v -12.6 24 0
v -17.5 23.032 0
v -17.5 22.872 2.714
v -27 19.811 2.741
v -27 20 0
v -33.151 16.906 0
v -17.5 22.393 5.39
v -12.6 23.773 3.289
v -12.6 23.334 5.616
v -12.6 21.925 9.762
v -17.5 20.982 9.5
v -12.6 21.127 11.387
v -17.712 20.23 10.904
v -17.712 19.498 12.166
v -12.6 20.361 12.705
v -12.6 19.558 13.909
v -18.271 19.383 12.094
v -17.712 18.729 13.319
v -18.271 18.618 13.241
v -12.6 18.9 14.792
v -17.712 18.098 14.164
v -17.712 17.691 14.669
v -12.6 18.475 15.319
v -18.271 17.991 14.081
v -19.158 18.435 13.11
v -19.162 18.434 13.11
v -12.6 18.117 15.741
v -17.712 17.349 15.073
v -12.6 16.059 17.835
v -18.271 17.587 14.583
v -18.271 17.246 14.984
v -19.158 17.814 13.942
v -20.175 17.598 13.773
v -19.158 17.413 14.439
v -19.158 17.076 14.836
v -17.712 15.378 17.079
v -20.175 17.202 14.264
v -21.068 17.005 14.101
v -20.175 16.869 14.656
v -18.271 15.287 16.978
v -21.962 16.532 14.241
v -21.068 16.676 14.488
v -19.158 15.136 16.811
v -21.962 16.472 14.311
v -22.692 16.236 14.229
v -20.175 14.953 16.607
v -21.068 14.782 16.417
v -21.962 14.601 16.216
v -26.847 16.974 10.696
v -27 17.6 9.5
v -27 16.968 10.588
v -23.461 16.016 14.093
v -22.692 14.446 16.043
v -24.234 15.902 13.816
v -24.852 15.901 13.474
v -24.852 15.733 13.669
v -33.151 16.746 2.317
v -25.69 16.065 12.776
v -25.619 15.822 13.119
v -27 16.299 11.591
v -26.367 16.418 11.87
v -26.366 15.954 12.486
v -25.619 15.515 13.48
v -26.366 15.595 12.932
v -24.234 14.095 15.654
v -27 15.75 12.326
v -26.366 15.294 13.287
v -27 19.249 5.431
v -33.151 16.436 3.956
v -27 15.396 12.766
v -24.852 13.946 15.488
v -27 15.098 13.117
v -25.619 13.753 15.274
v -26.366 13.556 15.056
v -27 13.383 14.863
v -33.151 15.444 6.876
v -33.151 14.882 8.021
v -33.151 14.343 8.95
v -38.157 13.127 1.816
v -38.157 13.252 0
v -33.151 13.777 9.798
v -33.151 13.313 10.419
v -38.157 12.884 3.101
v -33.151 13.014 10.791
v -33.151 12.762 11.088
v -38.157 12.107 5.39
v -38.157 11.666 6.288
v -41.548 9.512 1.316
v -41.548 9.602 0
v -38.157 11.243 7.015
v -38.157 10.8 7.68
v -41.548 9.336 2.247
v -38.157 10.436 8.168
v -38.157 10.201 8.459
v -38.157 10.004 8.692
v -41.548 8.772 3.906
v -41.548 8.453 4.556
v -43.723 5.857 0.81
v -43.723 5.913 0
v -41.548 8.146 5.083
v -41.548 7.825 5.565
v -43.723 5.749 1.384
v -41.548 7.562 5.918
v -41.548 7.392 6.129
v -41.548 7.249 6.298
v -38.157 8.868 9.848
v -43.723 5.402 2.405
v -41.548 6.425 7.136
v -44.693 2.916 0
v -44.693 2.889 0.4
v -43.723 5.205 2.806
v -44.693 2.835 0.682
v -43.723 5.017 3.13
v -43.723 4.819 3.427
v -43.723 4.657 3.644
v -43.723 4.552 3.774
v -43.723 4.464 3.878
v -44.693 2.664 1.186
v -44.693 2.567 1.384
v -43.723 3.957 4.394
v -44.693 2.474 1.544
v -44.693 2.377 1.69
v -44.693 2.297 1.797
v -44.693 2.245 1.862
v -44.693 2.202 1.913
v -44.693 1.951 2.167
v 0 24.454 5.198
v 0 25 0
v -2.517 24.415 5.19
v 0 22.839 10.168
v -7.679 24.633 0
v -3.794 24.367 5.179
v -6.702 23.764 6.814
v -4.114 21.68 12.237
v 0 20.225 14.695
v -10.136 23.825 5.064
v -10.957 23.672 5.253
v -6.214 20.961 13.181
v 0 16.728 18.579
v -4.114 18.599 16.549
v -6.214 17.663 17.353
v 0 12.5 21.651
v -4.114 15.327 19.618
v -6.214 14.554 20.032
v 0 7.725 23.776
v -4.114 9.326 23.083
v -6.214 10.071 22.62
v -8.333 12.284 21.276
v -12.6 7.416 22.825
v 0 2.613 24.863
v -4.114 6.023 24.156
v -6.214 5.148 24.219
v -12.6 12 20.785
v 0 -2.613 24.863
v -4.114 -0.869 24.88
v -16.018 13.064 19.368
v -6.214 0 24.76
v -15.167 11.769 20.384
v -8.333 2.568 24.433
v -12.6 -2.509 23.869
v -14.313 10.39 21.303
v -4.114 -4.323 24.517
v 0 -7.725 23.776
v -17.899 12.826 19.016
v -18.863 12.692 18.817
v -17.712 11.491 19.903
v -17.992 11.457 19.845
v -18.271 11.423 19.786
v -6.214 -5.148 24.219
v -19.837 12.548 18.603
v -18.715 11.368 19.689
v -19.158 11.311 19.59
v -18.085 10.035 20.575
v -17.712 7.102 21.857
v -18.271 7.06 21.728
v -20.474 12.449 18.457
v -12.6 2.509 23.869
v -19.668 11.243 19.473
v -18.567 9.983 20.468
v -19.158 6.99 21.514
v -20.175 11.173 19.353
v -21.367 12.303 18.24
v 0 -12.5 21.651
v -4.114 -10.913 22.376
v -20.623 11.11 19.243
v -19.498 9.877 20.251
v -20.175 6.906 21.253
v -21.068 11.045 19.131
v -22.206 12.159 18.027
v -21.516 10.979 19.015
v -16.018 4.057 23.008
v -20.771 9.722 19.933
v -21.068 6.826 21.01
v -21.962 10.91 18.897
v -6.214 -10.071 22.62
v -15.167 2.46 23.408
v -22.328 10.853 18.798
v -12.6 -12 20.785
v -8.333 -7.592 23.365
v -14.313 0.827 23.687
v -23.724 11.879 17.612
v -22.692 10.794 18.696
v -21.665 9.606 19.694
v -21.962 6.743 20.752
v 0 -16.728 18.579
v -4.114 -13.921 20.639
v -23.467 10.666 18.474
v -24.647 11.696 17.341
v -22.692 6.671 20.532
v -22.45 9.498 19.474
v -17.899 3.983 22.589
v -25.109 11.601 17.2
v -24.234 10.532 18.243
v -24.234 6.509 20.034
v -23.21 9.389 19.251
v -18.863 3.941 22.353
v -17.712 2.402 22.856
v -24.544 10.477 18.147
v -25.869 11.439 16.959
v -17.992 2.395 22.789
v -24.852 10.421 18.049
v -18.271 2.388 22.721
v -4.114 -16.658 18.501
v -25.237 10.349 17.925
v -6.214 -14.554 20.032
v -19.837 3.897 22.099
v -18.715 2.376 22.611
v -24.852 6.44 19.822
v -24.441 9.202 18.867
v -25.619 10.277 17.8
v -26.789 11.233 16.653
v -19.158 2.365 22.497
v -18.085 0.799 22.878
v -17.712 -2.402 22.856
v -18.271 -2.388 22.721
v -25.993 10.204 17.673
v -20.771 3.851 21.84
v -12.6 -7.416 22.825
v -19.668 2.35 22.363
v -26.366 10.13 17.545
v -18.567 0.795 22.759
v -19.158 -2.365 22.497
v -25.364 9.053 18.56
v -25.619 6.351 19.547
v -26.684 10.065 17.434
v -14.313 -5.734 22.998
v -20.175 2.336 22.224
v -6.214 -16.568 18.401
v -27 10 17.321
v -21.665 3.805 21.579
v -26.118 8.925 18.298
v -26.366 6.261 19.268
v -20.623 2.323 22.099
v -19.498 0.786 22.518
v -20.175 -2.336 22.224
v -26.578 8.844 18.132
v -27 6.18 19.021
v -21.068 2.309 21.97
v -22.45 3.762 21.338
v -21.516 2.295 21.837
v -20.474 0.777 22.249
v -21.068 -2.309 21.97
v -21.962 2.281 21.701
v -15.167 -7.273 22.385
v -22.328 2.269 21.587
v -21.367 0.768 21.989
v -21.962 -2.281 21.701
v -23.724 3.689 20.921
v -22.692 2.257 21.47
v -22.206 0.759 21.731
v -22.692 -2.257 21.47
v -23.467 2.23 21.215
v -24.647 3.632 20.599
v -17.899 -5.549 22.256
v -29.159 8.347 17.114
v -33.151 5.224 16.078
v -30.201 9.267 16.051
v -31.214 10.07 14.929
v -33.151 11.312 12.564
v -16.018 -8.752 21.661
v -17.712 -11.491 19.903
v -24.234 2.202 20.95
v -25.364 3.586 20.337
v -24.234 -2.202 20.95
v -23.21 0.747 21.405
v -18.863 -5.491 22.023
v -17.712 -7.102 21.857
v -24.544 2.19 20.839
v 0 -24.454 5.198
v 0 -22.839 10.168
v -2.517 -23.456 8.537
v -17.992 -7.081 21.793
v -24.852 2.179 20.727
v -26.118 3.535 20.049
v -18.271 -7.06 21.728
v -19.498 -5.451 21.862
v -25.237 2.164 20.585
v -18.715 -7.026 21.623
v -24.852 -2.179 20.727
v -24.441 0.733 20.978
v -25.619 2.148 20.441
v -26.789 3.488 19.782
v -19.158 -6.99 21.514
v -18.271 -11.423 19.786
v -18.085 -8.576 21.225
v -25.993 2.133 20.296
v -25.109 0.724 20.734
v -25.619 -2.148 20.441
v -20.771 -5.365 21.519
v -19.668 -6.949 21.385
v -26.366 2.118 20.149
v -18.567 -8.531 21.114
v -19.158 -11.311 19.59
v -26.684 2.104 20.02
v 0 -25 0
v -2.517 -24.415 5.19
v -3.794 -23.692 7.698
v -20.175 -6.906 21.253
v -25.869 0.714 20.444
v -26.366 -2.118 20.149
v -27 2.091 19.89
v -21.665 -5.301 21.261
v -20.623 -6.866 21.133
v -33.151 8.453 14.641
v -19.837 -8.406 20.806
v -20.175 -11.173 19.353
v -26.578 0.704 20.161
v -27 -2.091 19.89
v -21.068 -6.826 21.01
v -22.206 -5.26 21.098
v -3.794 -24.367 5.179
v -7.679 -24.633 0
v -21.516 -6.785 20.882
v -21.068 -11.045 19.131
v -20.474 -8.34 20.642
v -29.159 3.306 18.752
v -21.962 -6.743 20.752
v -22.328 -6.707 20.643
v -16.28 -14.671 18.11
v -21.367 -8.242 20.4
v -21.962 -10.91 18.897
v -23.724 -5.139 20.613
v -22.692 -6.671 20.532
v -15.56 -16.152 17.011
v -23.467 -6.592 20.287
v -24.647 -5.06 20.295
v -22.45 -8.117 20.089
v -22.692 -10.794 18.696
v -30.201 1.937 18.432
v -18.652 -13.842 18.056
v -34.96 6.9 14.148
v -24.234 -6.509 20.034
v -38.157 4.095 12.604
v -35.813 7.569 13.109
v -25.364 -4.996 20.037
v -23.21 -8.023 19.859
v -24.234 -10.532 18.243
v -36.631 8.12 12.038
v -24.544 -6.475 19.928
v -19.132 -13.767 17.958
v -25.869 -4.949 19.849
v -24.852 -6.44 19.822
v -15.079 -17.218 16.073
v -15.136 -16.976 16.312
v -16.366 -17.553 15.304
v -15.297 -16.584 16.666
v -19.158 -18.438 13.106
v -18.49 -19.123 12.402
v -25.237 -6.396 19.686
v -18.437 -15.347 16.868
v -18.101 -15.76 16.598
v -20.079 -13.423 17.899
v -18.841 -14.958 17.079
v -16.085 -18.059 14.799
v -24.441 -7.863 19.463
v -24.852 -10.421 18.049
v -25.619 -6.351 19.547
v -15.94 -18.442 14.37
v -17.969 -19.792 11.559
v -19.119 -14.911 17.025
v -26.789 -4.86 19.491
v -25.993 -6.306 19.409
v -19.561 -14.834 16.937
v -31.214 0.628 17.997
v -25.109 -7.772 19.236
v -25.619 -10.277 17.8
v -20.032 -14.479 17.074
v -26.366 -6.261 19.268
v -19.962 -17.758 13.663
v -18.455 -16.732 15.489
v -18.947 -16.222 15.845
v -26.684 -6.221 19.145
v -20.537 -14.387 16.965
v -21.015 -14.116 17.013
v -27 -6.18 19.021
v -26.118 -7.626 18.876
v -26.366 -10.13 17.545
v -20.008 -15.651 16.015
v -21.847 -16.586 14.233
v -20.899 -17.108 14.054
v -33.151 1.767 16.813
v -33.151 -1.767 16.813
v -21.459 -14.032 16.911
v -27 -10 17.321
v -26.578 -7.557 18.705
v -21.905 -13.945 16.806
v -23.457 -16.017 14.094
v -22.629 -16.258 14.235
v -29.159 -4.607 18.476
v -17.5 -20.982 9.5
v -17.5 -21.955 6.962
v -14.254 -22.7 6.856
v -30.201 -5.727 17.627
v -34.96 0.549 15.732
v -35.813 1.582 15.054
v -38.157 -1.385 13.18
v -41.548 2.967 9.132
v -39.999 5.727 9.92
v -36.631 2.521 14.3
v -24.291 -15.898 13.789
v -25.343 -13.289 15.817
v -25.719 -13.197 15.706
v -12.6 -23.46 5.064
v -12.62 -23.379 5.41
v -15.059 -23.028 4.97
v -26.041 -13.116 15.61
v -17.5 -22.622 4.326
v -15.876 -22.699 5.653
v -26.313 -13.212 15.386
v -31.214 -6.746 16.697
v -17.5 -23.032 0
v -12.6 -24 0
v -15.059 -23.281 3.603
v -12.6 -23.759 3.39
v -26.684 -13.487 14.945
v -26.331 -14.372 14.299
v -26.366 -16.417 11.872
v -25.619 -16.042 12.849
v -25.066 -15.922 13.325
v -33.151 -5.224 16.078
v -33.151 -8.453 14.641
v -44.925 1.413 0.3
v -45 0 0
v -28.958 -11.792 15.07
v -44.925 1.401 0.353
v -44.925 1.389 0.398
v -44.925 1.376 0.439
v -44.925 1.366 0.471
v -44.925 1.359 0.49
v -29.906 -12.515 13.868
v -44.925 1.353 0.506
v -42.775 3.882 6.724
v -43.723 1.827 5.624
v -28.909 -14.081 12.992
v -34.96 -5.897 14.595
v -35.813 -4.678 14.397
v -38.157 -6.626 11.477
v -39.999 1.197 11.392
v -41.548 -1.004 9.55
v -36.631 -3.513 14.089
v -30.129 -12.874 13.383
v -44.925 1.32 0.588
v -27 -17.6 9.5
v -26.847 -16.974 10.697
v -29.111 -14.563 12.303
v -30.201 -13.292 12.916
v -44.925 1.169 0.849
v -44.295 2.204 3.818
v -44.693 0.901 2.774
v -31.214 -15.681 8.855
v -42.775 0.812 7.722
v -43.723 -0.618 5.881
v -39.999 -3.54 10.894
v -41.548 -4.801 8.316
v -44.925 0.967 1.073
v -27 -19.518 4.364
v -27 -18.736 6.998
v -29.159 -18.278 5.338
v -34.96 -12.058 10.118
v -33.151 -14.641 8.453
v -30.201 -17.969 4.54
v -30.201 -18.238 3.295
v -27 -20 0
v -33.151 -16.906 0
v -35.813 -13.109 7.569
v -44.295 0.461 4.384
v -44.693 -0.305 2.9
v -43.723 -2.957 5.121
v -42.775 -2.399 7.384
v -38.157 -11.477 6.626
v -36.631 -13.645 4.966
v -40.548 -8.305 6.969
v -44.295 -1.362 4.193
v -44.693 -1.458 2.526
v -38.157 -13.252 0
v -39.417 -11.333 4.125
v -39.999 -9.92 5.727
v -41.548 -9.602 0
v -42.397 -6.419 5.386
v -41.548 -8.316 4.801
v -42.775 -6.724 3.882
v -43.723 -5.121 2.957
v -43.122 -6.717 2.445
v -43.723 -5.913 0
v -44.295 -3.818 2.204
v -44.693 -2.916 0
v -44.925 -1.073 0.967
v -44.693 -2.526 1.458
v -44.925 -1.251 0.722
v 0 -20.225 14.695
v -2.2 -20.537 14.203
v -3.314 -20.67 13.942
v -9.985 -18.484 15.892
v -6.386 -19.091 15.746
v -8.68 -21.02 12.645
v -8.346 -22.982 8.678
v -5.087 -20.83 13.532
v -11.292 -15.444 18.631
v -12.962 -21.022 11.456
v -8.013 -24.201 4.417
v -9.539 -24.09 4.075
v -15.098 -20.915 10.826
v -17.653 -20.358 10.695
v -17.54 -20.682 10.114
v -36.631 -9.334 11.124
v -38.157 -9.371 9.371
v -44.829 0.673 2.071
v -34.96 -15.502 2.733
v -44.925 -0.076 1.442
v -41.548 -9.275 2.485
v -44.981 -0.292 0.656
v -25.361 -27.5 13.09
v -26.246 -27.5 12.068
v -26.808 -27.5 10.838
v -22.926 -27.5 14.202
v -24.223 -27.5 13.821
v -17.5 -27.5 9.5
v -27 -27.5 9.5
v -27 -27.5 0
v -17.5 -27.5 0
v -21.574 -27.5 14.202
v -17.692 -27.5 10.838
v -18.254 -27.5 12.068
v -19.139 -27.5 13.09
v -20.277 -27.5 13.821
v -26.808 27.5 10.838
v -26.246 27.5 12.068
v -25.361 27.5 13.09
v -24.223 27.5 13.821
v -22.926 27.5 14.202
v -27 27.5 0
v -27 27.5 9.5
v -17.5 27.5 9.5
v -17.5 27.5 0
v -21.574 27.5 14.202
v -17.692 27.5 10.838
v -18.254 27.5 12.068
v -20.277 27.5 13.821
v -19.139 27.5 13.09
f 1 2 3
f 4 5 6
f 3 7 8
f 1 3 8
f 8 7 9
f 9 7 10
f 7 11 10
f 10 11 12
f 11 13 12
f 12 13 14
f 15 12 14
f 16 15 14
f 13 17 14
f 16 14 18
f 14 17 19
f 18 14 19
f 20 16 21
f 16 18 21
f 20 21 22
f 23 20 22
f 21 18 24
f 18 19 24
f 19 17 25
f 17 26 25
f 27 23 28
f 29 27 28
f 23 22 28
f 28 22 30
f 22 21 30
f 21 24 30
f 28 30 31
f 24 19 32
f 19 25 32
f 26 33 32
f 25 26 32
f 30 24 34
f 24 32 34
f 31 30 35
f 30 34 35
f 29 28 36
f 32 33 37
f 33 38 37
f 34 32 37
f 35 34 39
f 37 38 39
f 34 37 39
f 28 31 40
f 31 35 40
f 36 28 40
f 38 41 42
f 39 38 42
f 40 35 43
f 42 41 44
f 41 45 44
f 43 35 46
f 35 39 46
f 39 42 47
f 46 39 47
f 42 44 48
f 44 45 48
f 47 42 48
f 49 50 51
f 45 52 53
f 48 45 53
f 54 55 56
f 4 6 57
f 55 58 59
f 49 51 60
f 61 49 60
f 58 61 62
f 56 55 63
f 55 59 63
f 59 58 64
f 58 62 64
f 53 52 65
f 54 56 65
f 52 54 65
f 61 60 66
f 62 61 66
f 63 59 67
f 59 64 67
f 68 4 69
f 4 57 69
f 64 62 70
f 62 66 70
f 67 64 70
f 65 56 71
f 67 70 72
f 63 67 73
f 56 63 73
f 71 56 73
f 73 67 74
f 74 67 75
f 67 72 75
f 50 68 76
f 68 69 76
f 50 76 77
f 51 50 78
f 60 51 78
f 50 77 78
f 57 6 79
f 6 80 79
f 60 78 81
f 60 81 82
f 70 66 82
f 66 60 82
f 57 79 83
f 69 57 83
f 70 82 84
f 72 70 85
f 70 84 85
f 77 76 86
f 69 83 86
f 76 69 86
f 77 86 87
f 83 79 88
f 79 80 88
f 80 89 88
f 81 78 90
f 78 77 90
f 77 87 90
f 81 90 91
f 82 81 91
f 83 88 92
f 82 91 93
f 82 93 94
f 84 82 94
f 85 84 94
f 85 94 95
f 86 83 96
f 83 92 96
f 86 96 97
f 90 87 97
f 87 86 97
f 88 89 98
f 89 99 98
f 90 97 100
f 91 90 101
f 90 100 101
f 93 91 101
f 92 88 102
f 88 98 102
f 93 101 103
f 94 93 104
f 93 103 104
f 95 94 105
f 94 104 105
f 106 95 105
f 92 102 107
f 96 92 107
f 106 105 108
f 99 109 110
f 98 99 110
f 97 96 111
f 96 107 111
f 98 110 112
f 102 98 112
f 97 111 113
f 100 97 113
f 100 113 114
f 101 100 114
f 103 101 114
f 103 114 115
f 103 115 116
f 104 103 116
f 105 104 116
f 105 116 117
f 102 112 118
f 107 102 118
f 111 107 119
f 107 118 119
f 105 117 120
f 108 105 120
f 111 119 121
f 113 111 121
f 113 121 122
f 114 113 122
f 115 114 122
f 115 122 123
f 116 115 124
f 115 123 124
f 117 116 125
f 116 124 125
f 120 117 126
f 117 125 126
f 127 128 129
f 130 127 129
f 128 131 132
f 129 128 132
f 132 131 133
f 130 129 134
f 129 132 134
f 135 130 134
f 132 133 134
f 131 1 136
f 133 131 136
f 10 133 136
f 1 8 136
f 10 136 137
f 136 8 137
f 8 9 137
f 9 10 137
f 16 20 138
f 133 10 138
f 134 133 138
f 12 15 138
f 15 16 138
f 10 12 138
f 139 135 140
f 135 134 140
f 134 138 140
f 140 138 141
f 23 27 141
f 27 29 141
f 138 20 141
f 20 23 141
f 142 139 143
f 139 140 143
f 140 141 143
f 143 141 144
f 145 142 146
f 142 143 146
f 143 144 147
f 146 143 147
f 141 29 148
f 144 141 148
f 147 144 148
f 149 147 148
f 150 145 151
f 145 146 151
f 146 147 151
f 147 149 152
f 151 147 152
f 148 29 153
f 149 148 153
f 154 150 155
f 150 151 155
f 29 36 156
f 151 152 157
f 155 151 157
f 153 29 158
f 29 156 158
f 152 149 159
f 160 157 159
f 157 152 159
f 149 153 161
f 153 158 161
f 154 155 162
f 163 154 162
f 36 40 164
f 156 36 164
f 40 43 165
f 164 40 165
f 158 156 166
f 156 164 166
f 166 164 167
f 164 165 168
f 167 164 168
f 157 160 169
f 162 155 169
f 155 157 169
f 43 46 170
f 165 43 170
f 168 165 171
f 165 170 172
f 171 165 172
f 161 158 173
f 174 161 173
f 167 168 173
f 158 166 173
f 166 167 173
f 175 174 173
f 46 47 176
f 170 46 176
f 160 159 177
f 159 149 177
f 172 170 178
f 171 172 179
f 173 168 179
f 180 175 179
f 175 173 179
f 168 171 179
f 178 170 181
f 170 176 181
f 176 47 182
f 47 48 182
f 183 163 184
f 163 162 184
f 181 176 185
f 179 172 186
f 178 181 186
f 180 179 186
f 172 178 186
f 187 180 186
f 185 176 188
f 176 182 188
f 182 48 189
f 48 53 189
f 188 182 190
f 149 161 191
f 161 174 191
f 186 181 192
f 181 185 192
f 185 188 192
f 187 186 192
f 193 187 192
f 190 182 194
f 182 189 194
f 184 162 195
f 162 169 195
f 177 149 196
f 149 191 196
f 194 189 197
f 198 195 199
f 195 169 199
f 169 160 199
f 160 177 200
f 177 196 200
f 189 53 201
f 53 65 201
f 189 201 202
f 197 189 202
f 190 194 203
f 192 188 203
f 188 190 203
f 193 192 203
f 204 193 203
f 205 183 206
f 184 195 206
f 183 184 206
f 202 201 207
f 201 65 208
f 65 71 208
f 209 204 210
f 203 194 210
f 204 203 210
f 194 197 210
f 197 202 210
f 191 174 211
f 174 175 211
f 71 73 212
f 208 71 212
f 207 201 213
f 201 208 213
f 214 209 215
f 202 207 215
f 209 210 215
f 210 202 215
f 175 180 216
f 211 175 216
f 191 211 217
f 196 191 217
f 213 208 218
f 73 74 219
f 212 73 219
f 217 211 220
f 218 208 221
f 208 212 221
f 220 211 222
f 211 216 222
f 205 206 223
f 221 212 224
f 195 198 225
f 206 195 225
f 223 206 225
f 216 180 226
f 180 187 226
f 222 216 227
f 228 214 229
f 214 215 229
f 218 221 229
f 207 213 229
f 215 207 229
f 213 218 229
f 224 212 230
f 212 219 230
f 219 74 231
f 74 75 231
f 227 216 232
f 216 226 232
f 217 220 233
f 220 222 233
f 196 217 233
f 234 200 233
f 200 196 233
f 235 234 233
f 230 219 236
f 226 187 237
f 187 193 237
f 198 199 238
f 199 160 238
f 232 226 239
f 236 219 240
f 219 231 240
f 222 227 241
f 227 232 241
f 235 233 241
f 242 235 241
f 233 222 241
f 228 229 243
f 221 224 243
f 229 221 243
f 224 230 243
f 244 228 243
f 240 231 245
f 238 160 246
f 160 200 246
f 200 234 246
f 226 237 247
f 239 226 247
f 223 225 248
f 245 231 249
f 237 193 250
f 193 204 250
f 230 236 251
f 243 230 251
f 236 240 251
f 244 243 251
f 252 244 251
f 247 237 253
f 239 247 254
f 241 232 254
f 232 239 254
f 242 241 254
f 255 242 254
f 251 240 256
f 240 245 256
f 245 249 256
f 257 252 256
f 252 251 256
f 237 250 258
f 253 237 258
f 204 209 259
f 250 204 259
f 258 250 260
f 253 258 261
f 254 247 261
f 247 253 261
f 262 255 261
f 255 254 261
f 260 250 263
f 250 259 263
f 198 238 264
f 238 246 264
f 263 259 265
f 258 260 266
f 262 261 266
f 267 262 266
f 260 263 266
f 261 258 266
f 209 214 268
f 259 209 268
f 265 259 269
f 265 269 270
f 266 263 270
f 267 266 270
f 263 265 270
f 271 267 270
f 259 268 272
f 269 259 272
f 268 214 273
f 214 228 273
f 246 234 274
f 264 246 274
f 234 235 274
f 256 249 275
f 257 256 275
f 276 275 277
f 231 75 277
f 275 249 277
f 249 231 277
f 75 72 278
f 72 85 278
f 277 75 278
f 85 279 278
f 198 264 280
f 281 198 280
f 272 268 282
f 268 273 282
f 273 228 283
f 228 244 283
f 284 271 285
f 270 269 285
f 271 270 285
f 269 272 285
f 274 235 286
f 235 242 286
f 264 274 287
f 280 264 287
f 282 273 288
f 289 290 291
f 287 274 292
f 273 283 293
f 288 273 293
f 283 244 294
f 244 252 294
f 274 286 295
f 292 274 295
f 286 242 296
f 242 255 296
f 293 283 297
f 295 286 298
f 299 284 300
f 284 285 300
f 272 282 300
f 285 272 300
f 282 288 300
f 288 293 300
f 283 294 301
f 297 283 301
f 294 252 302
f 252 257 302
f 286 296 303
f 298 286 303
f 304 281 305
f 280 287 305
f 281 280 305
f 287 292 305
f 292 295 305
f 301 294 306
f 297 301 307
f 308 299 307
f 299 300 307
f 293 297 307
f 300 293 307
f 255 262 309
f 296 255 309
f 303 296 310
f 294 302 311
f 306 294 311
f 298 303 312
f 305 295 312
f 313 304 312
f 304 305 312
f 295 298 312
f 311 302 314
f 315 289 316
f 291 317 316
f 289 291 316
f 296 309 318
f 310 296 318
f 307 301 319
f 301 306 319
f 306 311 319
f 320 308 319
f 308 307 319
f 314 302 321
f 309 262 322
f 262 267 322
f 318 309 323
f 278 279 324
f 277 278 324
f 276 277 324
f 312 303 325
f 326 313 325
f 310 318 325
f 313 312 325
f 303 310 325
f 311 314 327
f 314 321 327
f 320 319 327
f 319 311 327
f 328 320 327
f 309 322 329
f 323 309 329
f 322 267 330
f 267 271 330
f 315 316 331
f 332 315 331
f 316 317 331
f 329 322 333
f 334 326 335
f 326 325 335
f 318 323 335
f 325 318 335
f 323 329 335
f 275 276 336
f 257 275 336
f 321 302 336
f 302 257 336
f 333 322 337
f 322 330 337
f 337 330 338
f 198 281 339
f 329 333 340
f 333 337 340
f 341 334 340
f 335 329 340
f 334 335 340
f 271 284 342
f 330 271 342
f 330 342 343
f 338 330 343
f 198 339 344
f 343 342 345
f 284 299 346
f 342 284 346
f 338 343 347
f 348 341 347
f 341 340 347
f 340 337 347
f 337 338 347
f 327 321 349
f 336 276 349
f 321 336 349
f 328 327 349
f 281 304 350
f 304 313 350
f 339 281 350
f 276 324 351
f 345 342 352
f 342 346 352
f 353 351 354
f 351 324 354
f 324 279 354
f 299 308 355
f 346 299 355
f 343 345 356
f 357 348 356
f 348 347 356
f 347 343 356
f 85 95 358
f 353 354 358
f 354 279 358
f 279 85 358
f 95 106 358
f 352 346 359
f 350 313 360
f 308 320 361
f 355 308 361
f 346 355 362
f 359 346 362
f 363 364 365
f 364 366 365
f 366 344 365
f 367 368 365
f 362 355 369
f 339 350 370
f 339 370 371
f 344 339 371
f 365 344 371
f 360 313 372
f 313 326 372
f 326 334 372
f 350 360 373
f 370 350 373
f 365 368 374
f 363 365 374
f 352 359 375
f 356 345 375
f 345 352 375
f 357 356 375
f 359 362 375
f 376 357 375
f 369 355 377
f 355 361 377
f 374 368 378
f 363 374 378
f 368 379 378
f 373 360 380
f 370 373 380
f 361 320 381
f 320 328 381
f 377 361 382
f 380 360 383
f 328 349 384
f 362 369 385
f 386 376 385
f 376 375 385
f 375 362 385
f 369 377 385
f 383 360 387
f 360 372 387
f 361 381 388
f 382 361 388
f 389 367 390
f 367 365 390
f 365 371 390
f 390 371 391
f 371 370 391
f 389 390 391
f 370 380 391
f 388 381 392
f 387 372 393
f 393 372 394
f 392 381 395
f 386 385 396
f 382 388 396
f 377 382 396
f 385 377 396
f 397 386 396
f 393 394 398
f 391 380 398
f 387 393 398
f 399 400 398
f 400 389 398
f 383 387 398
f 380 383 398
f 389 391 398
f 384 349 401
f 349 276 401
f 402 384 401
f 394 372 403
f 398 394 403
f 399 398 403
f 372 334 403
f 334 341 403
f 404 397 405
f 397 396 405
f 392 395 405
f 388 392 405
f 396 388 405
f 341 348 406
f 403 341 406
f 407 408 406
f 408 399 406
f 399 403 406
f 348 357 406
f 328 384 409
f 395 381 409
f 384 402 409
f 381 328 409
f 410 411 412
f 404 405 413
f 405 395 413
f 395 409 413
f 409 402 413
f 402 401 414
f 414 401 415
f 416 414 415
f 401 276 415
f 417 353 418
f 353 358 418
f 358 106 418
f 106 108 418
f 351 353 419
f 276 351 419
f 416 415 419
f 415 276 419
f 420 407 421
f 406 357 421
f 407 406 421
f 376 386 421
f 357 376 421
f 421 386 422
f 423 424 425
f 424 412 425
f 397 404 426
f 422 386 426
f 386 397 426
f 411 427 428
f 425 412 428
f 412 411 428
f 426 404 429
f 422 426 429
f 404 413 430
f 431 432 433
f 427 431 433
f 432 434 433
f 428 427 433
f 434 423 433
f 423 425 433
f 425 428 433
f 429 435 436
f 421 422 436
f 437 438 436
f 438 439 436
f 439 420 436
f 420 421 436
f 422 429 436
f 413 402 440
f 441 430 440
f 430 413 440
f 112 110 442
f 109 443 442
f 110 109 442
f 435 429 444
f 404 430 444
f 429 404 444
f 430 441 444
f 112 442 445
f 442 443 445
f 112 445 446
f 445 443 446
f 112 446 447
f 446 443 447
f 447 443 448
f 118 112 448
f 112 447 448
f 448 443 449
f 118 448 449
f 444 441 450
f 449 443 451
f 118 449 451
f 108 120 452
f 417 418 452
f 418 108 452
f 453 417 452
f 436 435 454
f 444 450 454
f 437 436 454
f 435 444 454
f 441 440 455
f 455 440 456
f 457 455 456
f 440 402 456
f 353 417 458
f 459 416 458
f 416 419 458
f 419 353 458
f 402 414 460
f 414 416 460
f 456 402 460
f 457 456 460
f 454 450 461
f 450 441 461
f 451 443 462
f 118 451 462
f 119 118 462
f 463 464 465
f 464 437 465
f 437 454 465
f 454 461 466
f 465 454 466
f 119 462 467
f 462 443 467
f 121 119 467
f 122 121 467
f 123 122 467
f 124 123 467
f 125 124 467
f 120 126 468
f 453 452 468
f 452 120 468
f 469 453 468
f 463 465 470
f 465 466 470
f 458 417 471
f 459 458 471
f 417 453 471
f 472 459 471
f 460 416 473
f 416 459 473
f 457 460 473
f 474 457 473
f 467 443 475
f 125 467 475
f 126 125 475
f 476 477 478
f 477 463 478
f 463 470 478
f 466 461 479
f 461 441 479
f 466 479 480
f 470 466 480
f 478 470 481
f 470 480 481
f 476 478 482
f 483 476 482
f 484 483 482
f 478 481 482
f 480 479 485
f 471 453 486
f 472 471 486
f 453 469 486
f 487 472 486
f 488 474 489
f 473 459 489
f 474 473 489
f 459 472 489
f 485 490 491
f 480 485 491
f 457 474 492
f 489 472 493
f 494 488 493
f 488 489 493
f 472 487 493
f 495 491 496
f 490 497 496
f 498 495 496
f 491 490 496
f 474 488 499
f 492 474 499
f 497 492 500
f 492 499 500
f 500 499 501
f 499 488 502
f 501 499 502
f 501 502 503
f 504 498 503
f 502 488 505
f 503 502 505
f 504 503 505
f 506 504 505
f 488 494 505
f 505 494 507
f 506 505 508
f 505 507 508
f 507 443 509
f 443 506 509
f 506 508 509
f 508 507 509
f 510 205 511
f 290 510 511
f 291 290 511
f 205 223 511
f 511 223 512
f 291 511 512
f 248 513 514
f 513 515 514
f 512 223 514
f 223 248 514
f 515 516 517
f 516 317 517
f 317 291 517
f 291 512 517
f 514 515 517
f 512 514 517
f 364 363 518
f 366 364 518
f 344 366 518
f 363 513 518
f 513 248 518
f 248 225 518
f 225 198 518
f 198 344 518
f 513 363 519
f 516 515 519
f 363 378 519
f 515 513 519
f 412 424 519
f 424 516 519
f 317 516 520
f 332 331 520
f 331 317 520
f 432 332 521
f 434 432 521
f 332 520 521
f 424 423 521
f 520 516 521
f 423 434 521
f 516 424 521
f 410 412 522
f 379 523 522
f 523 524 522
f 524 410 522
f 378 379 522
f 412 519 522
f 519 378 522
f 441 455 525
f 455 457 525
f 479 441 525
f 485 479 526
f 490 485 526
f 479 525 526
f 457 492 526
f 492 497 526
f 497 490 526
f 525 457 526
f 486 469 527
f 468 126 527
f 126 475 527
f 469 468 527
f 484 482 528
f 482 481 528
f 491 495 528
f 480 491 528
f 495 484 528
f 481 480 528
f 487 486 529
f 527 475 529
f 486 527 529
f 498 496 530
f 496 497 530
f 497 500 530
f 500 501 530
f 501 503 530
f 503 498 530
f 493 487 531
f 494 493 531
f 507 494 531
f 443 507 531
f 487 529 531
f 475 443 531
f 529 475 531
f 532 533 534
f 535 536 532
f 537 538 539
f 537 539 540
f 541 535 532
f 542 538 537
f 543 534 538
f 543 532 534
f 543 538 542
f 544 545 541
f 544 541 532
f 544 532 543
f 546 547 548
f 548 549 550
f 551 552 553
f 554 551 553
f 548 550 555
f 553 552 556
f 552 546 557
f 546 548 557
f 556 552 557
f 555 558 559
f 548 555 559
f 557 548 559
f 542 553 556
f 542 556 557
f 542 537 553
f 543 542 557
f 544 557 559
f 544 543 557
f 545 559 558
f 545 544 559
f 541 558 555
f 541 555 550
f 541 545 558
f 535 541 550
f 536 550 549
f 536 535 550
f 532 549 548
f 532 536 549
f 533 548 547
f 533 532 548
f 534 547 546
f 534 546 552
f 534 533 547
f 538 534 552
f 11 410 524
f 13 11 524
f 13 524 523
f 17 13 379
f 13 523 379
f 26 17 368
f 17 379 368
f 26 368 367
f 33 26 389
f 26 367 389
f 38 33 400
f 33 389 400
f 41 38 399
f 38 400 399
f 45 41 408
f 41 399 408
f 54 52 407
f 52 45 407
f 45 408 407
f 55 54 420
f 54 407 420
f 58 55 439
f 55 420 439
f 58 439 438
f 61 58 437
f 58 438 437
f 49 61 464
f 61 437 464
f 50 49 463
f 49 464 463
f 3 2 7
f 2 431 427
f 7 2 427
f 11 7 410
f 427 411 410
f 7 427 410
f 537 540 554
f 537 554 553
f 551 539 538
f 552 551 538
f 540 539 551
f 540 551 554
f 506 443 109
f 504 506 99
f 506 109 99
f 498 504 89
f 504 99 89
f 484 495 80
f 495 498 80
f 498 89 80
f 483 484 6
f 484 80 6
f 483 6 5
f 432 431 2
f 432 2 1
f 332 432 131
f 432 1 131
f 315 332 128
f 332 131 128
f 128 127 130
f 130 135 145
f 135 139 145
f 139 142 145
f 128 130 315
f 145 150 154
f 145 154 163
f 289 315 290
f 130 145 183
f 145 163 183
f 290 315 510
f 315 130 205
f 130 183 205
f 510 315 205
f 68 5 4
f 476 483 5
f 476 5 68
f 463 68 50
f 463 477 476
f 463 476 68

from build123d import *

# Parameters (mm, degrees)
F1_ANGLE_BACK = 90
F1_ANGLE      = 180
F2_W          = 9.5
F2_H          = 9.5
F3_DEPTH      = 27.5


with BuildPart() as f1:
    # F0 (on Front) → F1 (revolve)
    with BuildSketch(Plane.XZ, mode=Mode.PRIVATE) as f1_sk:
        with BuildLine():
            Line((0, 0), (0, 25))
            add(Edge.make_bspline(
                [(0, 25), (-45, 25), (-45, 0)],
                knots=[4.7123889804, 4.7123889804, 4.7123889804, 6.2831853072, 6.2831853072, 6.2831853072], degree=2, weights=[1, 0.7071067812, 1]))
            Line((-45, 0), (0, 0))
        make_face()
    revolve(f1_sk.sketch.rotate(Axis((-22.5, 0, 0), (1, 0, 0)), -F1_ANGLE_BACK), axis=Axis((-22.5, 0, 0), (1, 0, 0)), revolution_arc=F1_ANGLE)


with BuildPart() as f3:
    # F2 (on Front) → F3 (new body, symmetric)
    with BuildSketch(Plane.XZ):
        with Locations((-22.25, 4.75)):
            Rectangle(F2_W, F2_H)
        with BuildLine():
            ThreePointArc((-17.5, 9.5), (-22.25, 14.25), (-27, 9.5))
            Line((-27, 9.5), (-17.5, 9.5))
        make_face()
    extrude(amount=F3_DEPTH, both=True)


with BuildPart() as f1_1:
    add(f1.part)

    # F4: cut F3
    add(f3.part, mode=Mode.SUBTRACT)


solid = Compound([f3.part, f1_1.part])
